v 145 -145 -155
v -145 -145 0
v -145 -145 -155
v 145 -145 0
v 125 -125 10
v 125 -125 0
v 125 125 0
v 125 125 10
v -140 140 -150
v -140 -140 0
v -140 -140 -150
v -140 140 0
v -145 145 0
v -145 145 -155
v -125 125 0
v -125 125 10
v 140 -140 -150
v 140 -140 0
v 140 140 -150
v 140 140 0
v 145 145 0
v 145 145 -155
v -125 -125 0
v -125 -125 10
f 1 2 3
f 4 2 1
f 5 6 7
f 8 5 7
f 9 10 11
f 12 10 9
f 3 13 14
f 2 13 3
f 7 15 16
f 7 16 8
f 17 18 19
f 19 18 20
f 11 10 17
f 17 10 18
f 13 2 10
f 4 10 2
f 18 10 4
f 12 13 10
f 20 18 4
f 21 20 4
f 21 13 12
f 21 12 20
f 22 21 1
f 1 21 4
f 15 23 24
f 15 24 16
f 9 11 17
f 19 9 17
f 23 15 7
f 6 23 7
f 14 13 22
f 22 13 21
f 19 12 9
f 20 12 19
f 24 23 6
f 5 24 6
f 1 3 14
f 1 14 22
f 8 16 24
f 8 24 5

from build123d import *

# Parameters (mm, degrees)
F0_W     = 250
F0_H     = 250
F1_DEPTH = 10
F2_W     = 290
F2_H     = 290
F2_W_2   = 280
F2_H_2   = 280
F3_DEPTH = 150
F4_W     = 290
F4_H     = 290
F4_W_2   = 280
F4_H_2   = 280
F5_DEPTH = 5


with BuildPart() as f1:
    # F0 (on Top) → F1 (new body)
    with BuildSketch(Plane.XY):
        Rectangle(F0_W, F0_H)
    extrude(amount=F1_DEPTH)


with BuildPart() as f3:
    # F2 (on Top) → F3 (new body)
    with BuildSketch(Plane.XY):
        Rectangle(F2_W, F2_H)
        Rectangle(F2_W_2, F2_H_2, mode=Mode.SUBTRACT)
    extrude(amount=-F3_DEPTH)

    # F4 (on face) → F5 (join)
    with BuildSketch(Plane(origin=(0, 0, -150), x_dir=(1, 0, 0), z_dir=(0, 0, -1))):
        Rectangle(F4_W, F4_H)
        Rectangle(F4_W_2, F4_H_2, mode=Mode.SUBTRACT)
        Rectangle(F4_W_2, F4_H_2)
    extrude(amount=F5_DEPTH)


solid = Compound([f1.part, f3.part])
